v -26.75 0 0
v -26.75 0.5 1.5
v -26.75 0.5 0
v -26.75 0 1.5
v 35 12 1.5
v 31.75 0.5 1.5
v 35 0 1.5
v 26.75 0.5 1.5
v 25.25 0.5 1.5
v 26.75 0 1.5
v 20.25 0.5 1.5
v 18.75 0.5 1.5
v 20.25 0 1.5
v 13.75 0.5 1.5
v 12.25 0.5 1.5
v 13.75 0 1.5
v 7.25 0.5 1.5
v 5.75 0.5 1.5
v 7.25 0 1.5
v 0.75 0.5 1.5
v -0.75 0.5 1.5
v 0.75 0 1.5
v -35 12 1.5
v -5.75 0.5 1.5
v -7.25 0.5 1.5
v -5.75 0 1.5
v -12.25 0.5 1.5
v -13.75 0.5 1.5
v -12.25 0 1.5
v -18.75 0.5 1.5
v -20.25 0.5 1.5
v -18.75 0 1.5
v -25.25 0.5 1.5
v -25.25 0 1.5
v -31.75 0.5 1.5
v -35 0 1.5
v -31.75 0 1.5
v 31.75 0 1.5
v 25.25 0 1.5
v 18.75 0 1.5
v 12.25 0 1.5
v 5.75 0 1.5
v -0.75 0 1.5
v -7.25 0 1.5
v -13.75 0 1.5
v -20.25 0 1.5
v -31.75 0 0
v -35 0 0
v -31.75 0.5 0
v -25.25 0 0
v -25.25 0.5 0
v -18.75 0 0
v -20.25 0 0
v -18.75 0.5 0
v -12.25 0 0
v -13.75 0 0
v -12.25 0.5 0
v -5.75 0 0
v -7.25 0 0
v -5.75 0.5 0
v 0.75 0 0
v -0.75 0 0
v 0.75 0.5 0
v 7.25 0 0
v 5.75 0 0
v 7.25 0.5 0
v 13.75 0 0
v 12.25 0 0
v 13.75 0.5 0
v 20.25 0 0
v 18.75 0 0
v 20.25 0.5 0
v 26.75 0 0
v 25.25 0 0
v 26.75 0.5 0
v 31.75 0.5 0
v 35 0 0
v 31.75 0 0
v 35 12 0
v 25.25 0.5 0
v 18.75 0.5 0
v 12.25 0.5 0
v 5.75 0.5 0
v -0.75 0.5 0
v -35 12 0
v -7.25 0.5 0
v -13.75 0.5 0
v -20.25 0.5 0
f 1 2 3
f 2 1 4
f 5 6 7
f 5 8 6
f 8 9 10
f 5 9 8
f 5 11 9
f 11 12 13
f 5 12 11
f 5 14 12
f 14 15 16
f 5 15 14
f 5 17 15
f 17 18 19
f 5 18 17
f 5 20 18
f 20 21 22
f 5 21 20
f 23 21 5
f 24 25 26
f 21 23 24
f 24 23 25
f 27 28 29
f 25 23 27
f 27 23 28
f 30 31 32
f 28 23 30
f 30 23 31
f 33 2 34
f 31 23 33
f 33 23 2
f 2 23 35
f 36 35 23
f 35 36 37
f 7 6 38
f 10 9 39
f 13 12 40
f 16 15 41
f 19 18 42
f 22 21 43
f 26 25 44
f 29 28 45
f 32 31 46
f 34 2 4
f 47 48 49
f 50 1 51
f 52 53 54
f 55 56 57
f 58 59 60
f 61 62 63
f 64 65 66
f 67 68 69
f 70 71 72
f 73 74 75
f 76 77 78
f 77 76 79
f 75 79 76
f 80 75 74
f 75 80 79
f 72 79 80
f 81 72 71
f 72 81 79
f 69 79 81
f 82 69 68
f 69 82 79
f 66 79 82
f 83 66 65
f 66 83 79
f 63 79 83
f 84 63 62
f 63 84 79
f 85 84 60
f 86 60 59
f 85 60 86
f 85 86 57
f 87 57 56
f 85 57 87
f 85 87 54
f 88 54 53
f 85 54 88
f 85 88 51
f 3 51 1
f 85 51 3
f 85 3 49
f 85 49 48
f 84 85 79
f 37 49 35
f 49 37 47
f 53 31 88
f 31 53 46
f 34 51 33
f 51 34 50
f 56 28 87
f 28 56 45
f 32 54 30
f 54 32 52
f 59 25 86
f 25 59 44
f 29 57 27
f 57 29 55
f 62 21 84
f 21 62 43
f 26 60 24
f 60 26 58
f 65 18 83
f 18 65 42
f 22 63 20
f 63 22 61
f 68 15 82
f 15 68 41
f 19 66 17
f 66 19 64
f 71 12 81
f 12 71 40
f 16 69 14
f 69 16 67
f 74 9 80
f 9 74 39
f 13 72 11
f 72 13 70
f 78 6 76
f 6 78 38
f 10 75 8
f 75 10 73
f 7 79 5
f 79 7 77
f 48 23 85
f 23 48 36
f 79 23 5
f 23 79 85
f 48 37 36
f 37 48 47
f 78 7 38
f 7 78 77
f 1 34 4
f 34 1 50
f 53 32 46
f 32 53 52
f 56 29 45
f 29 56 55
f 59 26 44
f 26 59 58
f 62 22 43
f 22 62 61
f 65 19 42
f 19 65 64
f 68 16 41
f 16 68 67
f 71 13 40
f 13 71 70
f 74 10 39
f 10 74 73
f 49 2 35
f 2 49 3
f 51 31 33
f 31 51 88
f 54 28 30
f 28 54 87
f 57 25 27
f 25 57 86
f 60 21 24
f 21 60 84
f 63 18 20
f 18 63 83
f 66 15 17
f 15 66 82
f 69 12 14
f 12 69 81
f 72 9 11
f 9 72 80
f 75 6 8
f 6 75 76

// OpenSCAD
// 10-well comb for casting agarose gels
// Print orientation: flat on bed, teeth pointing down (-Y)

// ---------- Parameters ----------
plate_t      = 1.5;    // plate thickness (Z)
spine_l      = 70;     // spine length (X)
spine_w      = 12;     // spine width (Y)
tooth_n      = 10;     // number of teeth
tooth_w      = 5.0;    // tooth width (X)
tooth_l      = 12;     // tooth length (Y)
gap          = 1.5;    // gap between teeth (X)
overcut      = 0.5;    // extra length on cutters to avoid coplanar faces

$fn = 64;

// ---------- Derived ----------
pitch   = tooth_w + gap;                 // centre-to-centre spacing
x_start = -(tooth_n - 1) * pitch / 2;    // first tooth centre (row centred)

// ---------- Model ----------
difference() {
    union() {
        // Spine (back bar)
        translate([-spine_l / 2, 0, 0])
            cube([spine_l, spine_w, plate_t]);

        // Teeth
        for (i = [0 : tooth_n - 1])
            translate([x_start + i * pitch - tooth_w / 2,
                       -tooth_l,
                       0])
                cube([tooth_w, tooth_l + overcut, plate_t]);
    }

    // Cut out the wells (through the plate, into the teeth)
    for (i = [0 : tooth_n - 1])
        translate([x_start + i * pitch - tooth_w / 2,
                   -tooth_l - overcut,
                   -overcut])
            cube([tooth_w, tooth_l + 2 * overcut, plate_t + 2 * overcut]);
}
